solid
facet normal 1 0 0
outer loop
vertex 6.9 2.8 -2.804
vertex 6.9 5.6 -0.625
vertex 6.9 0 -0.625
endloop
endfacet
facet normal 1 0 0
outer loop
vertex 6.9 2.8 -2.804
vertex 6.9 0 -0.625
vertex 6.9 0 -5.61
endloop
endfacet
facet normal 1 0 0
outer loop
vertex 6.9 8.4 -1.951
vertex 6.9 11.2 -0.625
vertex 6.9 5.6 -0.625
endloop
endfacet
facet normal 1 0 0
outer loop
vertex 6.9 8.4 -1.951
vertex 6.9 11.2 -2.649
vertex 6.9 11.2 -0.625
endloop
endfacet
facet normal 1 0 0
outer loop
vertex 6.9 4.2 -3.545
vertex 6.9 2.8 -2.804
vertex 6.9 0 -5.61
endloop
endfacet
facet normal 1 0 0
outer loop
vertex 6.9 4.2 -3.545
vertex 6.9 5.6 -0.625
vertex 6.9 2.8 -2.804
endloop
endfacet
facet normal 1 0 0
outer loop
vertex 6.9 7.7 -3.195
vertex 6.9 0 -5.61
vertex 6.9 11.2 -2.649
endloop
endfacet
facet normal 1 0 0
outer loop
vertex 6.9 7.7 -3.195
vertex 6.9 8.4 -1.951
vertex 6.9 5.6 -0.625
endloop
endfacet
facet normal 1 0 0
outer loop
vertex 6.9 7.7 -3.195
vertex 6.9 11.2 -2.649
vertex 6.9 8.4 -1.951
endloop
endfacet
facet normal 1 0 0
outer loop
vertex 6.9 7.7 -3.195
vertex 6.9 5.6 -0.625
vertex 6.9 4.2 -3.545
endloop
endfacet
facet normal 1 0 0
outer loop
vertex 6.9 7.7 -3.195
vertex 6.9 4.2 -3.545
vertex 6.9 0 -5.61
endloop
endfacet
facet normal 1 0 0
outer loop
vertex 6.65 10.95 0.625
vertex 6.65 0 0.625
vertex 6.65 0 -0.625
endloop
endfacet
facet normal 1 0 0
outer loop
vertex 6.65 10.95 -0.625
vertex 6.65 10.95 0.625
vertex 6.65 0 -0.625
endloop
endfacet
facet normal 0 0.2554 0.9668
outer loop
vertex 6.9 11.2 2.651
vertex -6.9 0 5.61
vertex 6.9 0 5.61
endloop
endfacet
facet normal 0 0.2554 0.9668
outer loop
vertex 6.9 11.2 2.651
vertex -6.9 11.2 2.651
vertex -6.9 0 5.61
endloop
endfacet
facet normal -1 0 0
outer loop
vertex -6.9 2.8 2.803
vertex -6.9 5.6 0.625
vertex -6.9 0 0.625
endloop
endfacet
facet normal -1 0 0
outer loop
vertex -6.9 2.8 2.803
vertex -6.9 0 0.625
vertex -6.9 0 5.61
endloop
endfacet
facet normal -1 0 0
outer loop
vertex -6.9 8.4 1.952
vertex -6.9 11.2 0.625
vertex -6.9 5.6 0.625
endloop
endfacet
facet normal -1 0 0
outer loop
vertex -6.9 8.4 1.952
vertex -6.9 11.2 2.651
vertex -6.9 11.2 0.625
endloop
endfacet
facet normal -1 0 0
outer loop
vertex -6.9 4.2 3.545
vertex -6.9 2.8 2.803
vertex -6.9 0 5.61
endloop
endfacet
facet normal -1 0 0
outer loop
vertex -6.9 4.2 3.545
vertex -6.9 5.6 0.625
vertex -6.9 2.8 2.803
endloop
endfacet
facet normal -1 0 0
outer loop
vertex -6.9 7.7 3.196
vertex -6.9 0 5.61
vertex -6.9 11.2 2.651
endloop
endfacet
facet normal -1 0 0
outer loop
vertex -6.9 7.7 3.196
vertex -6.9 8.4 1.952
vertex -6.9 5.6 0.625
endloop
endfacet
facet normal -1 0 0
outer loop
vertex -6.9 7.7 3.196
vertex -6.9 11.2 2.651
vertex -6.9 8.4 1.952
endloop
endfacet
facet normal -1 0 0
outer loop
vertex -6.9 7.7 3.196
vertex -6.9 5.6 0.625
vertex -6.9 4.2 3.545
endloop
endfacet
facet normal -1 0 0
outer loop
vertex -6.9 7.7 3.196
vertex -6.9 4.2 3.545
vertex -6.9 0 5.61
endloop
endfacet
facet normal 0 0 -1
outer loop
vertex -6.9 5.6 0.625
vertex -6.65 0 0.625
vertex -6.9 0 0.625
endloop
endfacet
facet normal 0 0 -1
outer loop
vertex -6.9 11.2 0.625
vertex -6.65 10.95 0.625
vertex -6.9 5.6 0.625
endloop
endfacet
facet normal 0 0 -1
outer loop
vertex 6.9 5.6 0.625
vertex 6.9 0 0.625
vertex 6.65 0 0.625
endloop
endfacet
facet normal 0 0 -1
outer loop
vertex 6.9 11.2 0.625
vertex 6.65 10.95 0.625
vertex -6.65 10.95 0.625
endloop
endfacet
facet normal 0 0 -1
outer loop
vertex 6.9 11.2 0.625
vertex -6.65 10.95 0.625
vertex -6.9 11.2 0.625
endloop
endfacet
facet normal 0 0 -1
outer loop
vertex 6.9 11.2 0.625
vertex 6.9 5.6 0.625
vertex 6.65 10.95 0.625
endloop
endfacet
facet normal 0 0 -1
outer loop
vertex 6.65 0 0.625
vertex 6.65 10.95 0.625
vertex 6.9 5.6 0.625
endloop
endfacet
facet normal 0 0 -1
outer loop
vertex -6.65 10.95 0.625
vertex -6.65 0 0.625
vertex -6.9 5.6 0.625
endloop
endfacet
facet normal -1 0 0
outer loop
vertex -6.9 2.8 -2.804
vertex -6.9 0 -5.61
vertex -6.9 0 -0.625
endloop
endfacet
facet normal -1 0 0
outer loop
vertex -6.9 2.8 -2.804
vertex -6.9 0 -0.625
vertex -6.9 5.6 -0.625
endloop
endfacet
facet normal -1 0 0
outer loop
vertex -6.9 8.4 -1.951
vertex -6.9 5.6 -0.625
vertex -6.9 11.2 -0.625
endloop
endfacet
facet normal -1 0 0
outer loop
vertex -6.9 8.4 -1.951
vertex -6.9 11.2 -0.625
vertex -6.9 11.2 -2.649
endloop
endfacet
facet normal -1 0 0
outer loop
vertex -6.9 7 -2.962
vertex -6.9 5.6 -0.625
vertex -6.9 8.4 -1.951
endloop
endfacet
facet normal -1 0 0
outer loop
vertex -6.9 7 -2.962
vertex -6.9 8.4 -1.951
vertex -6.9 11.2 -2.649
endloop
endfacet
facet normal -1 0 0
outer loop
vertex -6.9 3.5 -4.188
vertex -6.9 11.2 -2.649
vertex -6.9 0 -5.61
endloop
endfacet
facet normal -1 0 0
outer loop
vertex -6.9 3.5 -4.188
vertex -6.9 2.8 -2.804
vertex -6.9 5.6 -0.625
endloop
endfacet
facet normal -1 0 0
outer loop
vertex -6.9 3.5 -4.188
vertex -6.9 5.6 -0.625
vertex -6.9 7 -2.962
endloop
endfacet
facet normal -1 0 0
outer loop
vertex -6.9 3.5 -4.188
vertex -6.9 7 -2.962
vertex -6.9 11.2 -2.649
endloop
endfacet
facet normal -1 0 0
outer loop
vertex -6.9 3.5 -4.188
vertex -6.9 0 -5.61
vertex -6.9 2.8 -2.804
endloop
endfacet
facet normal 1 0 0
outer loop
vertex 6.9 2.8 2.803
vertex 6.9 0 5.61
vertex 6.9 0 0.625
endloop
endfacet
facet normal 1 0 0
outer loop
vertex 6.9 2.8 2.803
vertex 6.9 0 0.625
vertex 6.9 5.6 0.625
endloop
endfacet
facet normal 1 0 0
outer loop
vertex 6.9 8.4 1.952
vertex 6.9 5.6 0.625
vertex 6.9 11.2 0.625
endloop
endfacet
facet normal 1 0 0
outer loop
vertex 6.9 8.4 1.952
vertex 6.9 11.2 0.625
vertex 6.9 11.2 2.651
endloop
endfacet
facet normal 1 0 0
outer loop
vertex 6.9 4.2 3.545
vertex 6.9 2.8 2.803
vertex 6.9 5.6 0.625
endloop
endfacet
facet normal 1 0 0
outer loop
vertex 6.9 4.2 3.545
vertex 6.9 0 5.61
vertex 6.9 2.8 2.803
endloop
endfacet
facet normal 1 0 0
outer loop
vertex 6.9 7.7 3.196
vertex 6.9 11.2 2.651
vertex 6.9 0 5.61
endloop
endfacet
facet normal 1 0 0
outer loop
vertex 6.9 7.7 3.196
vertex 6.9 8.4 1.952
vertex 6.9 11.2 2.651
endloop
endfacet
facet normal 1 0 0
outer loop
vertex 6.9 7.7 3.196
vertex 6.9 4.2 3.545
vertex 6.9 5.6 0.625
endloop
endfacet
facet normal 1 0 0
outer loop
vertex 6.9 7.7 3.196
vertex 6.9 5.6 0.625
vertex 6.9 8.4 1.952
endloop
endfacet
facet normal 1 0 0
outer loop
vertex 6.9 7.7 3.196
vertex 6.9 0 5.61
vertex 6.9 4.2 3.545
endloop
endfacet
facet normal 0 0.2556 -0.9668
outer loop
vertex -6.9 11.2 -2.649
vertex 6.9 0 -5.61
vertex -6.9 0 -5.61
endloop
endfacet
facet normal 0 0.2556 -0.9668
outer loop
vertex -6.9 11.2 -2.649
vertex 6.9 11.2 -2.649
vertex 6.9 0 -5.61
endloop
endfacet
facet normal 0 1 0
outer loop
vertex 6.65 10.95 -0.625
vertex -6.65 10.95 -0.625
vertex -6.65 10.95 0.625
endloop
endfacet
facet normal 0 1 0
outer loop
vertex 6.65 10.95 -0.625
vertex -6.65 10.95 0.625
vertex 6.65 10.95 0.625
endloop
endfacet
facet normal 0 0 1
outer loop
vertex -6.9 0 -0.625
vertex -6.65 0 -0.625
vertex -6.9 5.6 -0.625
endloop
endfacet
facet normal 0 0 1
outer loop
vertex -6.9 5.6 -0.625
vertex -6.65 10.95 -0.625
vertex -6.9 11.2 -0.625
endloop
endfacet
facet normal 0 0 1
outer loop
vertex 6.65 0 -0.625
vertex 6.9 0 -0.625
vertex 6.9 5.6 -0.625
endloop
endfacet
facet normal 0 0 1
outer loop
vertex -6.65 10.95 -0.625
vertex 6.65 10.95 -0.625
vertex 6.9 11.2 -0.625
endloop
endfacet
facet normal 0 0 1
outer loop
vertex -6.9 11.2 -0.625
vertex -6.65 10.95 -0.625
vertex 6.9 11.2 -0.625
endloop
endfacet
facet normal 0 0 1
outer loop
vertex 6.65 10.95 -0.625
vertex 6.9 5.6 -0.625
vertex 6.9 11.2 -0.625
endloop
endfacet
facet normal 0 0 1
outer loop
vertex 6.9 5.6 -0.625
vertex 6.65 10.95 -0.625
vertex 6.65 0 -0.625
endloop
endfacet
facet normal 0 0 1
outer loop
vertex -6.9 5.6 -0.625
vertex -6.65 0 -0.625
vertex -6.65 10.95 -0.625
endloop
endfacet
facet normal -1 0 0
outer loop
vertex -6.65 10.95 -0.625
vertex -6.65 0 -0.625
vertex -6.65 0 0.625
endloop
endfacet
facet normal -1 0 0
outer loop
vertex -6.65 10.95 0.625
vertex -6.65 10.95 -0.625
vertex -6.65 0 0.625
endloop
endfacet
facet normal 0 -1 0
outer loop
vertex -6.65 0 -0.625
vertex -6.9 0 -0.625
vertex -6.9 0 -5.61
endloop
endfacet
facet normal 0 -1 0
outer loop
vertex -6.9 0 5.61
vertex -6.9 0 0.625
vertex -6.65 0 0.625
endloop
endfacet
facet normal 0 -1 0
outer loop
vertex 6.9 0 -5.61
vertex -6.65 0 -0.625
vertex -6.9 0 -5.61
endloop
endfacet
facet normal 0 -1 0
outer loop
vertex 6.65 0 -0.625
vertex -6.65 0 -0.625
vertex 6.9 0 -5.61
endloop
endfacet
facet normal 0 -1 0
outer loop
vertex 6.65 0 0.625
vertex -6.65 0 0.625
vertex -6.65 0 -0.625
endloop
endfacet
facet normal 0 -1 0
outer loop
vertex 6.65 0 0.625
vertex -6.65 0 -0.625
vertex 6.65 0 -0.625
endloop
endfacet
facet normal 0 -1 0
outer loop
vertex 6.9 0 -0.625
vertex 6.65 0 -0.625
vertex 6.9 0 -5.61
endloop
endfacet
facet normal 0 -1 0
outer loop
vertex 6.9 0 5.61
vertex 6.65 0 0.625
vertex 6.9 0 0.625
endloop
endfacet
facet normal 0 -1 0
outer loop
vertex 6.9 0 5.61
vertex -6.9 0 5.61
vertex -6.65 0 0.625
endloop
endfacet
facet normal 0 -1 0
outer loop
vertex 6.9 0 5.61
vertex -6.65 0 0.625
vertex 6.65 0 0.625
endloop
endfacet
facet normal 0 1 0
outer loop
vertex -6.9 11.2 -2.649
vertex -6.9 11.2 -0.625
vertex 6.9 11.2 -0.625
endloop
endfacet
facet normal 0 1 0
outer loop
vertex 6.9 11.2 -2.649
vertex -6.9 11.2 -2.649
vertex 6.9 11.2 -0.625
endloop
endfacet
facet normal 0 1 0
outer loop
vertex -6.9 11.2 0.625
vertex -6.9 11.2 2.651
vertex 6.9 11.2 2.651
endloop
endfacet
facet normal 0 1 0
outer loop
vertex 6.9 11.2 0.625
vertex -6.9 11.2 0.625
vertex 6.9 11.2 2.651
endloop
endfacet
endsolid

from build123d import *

# Parameters (mm, degrees)
SKETCH4_W          = 13.8
SKETCH4_H          = 1.25
CUT_EXTRUDE1_DEPTH = 0.25
SKETCH5_W          = 1.25
SKETCH5_H          = 10.95
CUT_EXTRUDE2_DEPTH = 0.25
SKETCH6_W          = 1.25
SKETCH6_H          = 10.95
CUT_EXTRUDE3_DEPTH = 0.25


with BuildPart() as part:
    # Sketch1 → Loft1 section 0
    with BuildSketch(Plane(origin=(0, 0, 0), x_dir=(1, 0, 0), z_dir=(0, 1, 0))):
        with BuildLine():
            Line((-6.9, -5.61), (6.9, -5.61))
            Line((6.9, -5.61), (6.9, 5.61))
            Line((6.9, 5.61), (-6.9, 5.61))
            Line((-6.9, 5.61), (-6.9, -5.61))
        make_face()
    # Sketch2 → Loft1 section 1
    with BuildSketch(Plane(origin=(0, 11.2, 0), x_dir=(1, 0, 0), z_dir=(0, 1, 0))):
        with BuildLine():
            Line((-6.9, -2.651033308), (6.9, -2.651033308))
            Line((6.9, -2.651033308), (6.9, 2.648966692))
            Line((6.9, 2.648966692), (-6.9, 2.648966692))
            Line((-6.9, 2.648966692), (-6.9, -2.651033308))
        make_face()
    loft()

    # Sketch4 → Cut-Extrude1 (cut)
    with BuildSketch(Plane(origin=(0, 11.2, 0), x_dir=(1, 0, 0), z_dir=(0, 1, 0))):
        Rectangle(SKETCH4_W, SKETCH4_H)
    extrude(amount=-CUT_EXTRUDE1_DEPTH, mode=Mode.SUBTRACT)

    # Sketch5 → Cut-Extrude2 (cut)
    with BuildSketch(Plane(origin=(6.9, 0, 0), x_dir=(0, 0, -1), z_dir=(1, 0, 0))):
        with Locations((0, 5.475)):
            Rectangle(SKETCH5_W, SKETCH5_H)
    extrude(amount=-CUT_EXTRUDE2_DEPTH, mode=Mode.SUBTRACT)

    # Sketch6 → Cut-Extrude3 (cut)
    with BuildSketch(Plane.ZY.offset(6.9)):
        with Locations((0, 5.475)):
            Rectangle(SKETCH6_W, SKETCH6_H)
    extrude(amount=-CUT_EXTRUDE3_DEPTH, mode=Mode.SUBTRACT)


solid = part.part
